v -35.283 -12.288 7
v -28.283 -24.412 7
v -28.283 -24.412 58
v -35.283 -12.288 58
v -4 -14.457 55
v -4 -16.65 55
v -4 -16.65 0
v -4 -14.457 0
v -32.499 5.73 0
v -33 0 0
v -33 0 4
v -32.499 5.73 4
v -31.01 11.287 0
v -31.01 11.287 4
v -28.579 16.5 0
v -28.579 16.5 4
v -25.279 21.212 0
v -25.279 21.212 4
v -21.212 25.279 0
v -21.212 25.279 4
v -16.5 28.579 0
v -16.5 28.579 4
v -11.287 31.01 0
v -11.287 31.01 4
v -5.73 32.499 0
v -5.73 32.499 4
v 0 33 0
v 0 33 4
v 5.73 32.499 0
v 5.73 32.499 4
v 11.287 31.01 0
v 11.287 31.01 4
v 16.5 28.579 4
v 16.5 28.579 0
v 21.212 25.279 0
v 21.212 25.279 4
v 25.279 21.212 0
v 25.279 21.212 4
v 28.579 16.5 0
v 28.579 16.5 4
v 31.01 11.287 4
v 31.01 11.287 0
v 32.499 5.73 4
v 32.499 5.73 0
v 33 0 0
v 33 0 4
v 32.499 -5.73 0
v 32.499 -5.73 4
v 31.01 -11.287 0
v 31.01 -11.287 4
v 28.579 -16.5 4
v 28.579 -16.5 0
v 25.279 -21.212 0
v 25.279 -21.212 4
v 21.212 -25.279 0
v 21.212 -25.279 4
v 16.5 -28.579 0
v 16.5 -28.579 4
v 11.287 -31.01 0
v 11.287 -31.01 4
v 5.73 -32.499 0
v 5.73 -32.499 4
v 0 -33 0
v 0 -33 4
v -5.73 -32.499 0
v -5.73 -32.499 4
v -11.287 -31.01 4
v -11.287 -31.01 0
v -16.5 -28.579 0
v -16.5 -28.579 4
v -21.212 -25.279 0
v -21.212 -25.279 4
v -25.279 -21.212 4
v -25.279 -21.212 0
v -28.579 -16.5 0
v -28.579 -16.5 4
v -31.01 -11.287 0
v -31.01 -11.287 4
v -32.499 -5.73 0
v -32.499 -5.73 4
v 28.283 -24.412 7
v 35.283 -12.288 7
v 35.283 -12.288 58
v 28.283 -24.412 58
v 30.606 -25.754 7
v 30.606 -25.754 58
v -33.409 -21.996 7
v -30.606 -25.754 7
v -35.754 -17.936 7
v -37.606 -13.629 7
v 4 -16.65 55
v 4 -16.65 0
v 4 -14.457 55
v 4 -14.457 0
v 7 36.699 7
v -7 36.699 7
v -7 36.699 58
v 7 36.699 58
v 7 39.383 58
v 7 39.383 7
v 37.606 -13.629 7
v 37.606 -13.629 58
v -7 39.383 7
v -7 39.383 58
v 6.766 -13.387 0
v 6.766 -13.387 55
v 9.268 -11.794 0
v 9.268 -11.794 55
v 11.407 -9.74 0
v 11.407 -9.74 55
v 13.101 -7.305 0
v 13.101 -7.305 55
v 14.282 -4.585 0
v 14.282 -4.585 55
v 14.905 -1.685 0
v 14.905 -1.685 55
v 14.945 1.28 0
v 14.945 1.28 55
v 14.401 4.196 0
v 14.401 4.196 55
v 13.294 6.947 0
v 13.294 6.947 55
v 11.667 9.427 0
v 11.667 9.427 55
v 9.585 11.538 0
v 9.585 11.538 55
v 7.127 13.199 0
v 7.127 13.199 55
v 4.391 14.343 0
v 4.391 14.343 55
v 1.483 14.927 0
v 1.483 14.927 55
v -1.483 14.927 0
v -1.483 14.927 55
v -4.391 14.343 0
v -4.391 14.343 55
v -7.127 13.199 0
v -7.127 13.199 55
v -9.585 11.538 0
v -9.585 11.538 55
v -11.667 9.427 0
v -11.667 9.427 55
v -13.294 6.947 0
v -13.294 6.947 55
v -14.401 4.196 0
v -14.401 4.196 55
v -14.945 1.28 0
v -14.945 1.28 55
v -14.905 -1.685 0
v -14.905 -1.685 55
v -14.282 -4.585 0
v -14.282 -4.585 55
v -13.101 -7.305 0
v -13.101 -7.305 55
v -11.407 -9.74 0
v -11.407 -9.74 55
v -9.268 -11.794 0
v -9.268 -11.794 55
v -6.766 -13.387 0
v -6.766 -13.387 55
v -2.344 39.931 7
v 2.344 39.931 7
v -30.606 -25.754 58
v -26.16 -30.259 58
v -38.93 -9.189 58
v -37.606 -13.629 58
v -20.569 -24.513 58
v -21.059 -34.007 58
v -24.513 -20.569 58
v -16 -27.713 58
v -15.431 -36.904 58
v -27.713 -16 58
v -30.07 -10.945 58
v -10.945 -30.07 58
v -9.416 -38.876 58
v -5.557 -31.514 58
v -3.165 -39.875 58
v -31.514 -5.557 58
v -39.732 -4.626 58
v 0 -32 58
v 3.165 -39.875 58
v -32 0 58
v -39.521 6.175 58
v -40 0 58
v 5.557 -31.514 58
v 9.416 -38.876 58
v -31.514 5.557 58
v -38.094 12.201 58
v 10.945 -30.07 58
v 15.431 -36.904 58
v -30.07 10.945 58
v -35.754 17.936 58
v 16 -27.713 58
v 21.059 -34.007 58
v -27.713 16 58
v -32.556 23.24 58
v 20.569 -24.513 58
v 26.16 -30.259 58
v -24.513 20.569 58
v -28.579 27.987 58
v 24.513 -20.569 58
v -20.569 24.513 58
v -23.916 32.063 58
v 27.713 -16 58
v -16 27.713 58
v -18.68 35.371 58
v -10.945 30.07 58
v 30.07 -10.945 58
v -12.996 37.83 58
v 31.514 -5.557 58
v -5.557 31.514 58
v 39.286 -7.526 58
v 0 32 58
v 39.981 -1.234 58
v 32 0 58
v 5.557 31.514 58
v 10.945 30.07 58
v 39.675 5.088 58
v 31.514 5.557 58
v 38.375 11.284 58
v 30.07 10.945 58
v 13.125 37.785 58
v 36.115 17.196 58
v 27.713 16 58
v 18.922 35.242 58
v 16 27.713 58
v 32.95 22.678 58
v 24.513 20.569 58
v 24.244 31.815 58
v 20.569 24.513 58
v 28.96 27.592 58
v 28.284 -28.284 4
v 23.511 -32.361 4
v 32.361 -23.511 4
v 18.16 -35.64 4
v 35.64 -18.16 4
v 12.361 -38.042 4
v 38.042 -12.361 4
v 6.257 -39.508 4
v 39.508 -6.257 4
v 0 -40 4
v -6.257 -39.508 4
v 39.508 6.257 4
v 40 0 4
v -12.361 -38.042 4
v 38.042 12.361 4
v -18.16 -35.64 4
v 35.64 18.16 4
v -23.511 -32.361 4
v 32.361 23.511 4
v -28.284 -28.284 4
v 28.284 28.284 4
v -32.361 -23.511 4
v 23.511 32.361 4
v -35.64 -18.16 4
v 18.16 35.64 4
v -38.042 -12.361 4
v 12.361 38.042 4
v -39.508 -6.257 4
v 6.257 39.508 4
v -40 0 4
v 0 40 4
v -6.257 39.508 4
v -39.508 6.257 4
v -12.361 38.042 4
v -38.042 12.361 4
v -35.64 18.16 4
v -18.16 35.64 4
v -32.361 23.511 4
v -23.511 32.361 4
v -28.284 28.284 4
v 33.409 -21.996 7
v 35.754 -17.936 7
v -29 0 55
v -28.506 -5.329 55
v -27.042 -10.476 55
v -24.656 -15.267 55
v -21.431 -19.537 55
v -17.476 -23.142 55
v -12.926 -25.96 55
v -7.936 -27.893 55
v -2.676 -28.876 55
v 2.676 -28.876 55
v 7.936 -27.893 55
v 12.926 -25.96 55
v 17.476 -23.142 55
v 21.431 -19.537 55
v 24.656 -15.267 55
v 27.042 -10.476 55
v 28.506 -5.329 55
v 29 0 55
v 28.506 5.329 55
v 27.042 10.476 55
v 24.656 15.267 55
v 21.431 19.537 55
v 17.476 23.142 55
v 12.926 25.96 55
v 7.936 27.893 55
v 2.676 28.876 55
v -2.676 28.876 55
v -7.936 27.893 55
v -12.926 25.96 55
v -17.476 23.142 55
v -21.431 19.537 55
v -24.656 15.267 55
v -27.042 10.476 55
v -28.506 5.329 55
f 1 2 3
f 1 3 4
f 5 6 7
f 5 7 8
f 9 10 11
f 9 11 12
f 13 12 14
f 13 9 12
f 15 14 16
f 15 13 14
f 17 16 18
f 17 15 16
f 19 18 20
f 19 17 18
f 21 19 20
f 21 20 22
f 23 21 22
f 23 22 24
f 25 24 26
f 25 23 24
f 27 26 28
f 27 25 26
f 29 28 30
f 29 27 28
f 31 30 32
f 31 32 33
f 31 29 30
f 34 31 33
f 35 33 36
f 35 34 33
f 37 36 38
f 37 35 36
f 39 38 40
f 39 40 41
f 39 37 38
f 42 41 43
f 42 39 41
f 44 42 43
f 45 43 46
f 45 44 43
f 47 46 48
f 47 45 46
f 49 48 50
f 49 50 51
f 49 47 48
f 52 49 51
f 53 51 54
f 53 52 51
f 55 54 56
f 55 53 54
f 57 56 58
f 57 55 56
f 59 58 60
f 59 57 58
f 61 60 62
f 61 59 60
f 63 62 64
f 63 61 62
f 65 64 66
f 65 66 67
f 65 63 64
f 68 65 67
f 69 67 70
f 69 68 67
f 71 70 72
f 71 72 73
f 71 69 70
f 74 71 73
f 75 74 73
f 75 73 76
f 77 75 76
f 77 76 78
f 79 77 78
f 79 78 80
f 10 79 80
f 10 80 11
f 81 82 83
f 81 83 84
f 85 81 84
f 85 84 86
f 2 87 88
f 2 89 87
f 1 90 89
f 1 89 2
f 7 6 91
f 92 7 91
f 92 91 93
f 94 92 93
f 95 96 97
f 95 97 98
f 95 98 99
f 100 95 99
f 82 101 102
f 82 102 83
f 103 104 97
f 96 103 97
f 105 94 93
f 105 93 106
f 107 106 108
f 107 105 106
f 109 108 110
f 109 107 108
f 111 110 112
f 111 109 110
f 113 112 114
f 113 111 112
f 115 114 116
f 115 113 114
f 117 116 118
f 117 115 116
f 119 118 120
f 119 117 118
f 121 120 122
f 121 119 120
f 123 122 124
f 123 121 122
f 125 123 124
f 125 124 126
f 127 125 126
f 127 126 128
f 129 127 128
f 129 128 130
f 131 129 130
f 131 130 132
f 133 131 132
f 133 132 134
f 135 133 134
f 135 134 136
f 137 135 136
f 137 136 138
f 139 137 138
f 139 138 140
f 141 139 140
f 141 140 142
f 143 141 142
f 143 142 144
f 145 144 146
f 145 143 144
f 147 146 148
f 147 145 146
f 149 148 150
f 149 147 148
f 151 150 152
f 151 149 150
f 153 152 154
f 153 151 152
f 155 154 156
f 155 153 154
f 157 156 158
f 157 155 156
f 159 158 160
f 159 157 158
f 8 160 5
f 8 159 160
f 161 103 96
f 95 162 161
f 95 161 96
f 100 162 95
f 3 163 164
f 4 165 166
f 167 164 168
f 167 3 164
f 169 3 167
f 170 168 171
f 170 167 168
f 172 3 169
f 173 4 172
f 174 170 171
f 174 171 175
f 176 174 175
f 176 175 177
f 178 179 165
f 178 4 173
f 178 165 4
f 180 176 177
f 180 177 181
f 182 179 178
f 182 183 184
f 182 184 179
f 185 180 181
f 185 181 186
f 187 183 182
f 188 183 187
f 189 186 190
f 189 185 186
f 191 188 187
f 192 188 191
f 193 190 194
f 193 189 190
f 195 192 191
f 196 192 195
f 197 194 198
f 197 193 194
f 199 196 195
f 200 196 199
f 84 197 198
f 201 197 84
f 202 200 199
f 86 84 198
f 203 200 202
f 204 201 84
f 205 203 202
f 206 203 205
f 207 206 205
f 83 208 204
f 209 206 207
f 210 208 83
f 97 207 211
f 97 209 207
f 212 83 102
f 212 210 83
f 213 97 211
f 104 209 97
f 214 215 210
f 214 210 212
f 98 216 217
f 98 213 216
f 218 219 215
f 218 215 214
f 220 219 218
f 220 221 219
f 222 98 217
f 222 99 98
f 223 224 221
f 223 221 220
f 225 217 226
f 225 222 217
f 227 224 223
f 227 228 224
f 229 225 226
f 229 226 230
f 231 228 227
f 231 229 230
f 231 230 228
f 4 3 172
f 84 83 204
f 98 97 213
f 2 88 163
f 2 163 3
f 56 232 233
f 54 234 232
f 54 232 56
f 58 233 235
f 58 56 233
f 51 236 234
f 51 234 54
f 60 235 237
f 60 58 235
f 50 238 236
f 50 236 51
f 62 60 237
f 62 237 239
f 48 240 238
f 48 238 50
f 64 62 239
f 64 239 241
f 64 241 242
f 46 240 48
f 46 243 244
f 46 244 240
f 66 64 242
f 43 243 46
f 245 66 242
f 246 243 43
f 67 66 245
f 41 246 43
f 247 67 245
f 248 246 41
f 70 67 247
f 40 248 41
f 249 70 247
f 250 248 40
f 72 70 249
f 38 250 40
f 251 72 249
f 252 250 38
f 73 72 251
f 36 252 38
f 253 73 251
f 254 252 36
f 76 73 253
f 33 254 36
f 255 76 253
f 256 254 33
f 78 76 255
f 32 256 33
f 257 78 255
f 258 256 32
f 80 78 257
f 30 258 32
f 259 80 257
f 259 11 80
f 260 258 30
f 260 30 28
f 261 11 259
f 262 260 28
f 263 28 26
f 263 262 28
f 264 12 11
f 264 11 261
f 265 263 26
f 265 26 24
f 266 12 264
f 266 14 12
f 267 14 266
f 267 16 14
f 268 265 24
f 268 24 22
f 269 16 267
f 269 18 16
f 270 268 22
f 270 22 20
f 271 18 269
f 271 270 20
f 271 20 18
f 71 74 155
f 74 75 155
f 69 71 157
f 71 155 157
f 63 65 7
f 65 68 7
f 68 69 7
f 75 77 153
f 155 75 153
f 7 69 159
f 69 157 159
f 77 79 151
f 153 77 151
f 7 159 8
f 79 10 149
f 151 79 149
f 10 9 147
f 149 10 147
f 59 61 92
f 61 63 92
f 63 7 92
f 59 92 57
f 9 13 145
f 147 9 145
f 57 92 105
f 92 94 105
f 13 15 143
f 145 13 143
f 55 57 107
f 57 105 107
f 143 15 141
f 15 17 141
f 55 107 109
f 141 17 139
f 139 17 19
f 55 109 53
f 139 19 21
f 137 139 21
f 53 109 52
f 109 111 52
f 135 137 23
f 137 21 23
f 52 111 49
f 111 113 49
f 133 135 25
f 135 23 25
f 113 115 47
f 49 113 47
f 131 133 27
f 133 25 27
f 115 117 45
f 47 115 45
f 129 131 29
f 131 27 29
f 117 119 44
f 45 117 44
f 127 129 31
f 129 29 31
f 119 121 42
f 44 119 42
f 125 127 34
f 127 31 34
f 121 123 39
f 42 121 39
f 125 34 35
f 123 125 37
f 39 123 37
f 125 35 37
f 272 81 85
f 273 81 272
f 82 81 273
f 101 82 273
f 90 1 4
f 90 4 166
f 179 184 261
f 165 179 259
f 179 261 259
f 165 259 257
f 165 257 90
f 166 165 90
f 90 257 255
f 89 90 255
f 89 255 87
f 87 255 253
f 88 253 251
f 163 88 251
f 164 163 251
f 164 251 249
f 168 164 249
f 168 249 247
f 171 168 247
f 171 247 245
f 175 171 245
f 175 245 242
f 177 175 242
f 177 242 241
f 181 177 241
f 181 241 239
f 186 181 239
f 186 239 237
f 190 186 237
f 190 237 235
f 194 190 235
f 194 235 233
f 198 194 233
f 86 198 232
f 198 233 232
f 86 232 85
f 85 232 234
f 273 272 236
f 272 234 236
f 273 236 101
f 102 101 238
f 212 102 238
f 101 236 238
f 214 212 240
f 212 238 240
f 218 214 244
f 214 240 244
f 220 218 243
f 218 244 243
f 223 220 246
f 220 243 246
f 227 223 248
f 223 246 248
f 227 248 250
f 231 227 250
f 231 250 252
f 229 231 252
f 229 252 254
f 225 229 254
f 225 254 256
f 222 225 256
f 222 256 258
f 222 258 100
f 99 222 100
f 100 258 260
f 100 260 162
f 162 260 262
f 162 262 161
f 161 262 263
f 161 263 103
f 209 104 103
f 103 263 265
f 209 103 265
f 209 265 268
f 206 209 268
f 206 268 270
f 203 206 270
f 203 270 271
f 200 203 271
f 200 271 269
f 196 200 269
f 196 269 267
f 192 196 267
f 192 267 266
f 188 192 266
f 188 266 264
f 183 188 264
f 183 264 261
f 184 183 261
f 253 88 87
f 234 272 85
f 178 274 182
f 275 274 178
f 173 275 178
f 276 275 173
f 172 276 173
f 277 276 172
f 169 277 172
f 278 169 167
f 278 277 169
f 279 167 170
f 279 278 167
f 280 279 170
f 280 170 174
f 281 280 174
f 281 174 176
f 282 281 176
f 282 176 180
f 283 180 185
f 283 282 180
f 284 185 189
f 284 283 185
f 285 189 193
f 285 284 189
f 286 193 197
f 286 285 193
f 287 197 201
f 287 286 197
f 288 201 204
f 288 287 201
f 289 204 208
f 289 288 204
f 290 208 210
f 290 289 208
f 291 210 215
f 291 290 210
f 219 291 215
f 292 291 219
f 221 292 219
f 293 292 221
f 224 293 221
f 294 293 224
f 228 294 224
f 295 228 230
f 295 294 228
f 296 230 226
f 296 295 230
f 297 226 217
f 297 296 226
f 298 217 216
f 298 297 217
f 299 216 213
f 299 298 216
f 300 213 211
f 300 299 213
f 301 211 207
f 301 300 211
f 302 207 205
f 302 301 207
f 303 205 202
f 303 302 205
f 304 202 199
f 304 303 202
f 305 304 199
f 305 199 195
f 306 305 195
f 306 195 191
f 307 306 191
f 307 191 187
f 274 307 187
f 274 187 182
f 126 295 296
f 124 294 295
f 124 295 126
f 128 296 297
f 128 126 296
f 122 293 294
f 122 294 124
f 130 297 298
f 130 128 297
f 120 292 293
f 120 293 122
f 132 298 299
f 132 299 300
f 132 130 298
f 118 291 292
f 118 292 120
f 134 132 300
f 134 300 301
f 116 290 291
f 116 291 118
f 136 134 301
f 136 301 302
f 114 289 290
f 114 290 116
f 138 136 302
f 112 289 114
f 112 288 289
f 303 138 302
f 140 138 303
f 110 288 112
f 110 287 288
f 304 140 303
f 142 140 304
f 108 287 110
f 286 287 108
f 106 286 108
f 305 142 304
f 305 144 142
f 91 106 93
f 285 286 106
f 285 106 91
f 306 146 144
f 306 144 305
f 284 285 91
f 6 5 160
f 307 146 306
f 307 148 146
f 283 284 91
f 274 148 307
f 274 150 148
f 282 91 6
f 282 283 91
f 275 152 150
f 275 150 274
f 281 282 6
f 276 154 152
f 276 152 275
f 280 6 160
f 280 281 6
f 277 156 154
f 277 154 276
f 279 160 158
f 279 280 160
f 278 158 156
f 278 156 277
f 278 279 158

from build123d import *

# Parameters (mm, degrees)
ESQUISSE1_R             = 40
ESQUISSE1_R_2           = 33
ESQUISSE1_R_3           = 15
BOSS_EXTRU_1_DEPTH      = 58
ESQUISSE2_W             = 8
ESQUISSE2_H             = 3.3
ENL_V_MAT_EXTRU_1_DEPTH = 82.018516402
ENL_V_START             = -51
ENL_V_MAT_EXTRU_2_DEPTH = 51
ESQUISSE4_R             = 40
ESQUISSE4_R_2           = 33
ENL_V_MAT_EXTRU_3_DEPTH = 4


with BuildPart() as part:
    # Esquisse1 → Boss.-Extru.1 (new body)
    # profile 1 of 2: a face of its own
    with BuildSketch(Plane.XY):
        with Locations(Location((0, 0, 0), (0, 0, 180))):
            Circle(ESQUISSE1_R)
        Circle(ESQUISSE1_R_2, mode=Mode.SUBTRACT)
    # profile 2 of 2: a face of its own
    with BuildSketch(Plane.XY):
        Circle(ESQUISSE1_R_2)
        with Locations(Location((0, 0, 0), (0, 0, 180))):
            Circle(ESQUISSE1_R_3, mode=Mode.SUBTRACT)
    extrude(amount=BOSS_EXTRU_1_DEPTH)

    # Esquisse2 → Enlèv. mat.-Extru.1 (cut, through all)
    with BuildSketch(Plane.XY.offset(58)):
        with Locations((0, -15)):
            Rectangle(ESQUISSE2_W, ESQUISSE2_H)
    extrude(amount=-ENL_V_MAT_EXTRU_1_DEPTH, mode=Mode.SUBTRACT)

    # Esquisse3 → Enlèv. mat.-Extru.2 (cut)
    with BuildSketch(Plane.XY.offset(58).offset(ENL_V_START)):
        with BuildLine():
            Line((40.999452493, -15.588141165), (37.606451003, -13.629190841))
            ThreePointArc((37.606451003, -13.629190841), (34.641016151, -20), (30.606451003, -25.753546494))
            Line((30.606451003, -25.753546494), (33.999452493, -27.712496818))
            Line((33.999452493, -27.712496818), (40.999452493, -15.588141165))
        make_face()
        with BuildLine():
            ThreePointArc((30.606451003, -25.753546494), (34.641016151, -20), (37.606451003, -13.629190841))
            Line((37.606451003, -13.629190841), (35.28257981, -12.287503182))
            Line((35.28257981, -12.287503182), (28.28257981, -24.411858835))
            Line((28.28257981, -24.411858835), (30.606451003, -25.753546494))
        make_face()
        with BuildLine():
            ThreePointArc((-30.606451003, -25.753546494), (-34.641016151, -20), (-37.606451003, -13.629190841))
            Line((-37.606451003, -13.629190841), (-40.999452493, -15.588141165))
            Line((-40.999452493, -15.588141165), (-33.999452493, -27.712496818))
            Line((-33.999452493, -27.712496818), (-30.606451003, -25.753546494))
        make_face()
        with BuildLine():
            Line((-35.28257981, -12.287503182), (-37.606451003, -13.629190841))
            ThreePointArc((-37.606451003, -13.629190841), (-34.641016151, -20), (-30.606451003, -25.753546494))
            Line((-30.606451003, -25.753546494), (-28.28257981, -24.411858835))
            Line((-28.28257981, -24.411858835), (-35.28257981, -12.287503182))
        make_face()
        with BuildLine():
            ThreePointArc((7, 39.382737335), (0, 40), (-7, 39.382737335))
            Line((-7, 39.382737335), (-7, 36.699362017))
            Line((-7, 36.699362017), (7, 36.699362017))
            Line((7, 36.699362017), (7, 39.382737335))
        make_face()
        with BuildLine():
            Line((7, 43.300637983), (-7, 43.300637983))
            Line((-7, 43.300637983), (-7, 39.382737335))
            ThreePointArc((-7, 39.382737335), (0, 40), (7, 39.382737335))
            Line((7, 39.382737335), (7, 43.300637983))
        make_face()
    extrude(amount=ENL_V_MAT_EXTRU_2_DEPTH, mode=Mode.SUBTRACT)

    # Esquisse4 → Enlèv. mat.-Extru.3 (cut)
    with BuildSketch(Plane(origin=(0, 0, 0), x_dir=(-1, 0, 0), z_dir=(0, 0, -1))):
        Circle(ESQUISSE4_R)
        Circle(ESQUISSE4_R_2, mode=Mode.SUBTRACT)
    extrude(amount=-ENL_V_MAT_EXTRU_3_DEPTH, mode=Mode.SUBTRACT)

    # Esquisse7 → Enlèvement de matière-Révolution2 (revolve, cut)
    with BuildSketch(Plane(origin=(0, 0, 0), x_dir=(0, 0, -1), z_dir=(1, 0, 0)), mode=Mode.PRIVATE) as enl_vement_de_mati_re_r_volution2_sk:
        Polygon((-58, 32), (-55, 29), (-55, 0), (-58, 0), align=None)
    revolve(enl_vement_de_mati_re_r_volution2_sk.sketch.rotate(Axis((0, 0, 0), (0, 0, 1)), 90), axis=Axis((0, 0, 0), (0, 0, 1)), mode=Mode.SUBTRACT)


solid = part.part
